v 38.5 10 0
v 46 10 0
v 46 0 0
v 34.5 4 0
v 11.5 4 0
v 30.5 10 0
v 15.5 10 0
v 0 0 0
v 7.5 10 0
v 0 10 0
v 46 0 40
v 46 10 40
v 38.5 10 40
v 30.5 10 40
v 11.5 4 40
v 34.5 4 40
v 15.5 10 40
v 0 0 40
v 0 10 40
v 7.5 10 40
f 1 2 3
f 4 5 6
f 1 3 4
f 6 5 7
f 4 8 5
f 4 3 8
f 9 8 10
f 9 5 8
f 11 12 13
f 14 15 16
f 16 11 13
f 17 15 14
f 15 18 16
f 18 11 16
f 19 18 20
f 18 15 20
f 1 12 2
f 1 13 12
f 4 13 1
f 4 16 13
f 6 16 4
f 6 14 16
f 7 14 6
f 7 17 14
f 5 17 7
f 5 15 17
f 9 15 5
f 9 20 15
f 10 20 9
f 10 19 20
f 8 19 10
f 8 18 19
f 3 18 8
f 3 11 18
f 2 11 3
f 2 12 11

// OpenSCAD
$fn = 32;

// ----------------------------------------------------------------------
// V guide rail: doublev, 46 mm wide
// ----------------------------------------------------------------------

// --- parameters (mm) ---
rail_w = 46;              // rail width, X
base_t = 10;              // base plate thickness
v_depth = 6;              // V feature depth / height
v_half_w = 8;             // half width of the V at the base face
plate_t = 40;             // rail length, Z (the extrusion height)
groove_off = 11.5;        // offset of each groove from the centreline

centre_x = rail_w / 2;  // rail centreline
groove_a = centre_x - groove_off;  // axis of the first groove
groove_b = centre_x + groove_off;  // axis of the second groove

profile = [[0, 0], [46, 0], [46, 10], [38.5, 10], [34.5, 4], [30.5, 10], [15.5, 10], [11.5, 4], [7.5, 10], [0, 10]];  // primary outline, 10 points, counter clockwise

// --- the one profile operation ---
linear_extrude(height = plate_t) polygon(points = profile);
